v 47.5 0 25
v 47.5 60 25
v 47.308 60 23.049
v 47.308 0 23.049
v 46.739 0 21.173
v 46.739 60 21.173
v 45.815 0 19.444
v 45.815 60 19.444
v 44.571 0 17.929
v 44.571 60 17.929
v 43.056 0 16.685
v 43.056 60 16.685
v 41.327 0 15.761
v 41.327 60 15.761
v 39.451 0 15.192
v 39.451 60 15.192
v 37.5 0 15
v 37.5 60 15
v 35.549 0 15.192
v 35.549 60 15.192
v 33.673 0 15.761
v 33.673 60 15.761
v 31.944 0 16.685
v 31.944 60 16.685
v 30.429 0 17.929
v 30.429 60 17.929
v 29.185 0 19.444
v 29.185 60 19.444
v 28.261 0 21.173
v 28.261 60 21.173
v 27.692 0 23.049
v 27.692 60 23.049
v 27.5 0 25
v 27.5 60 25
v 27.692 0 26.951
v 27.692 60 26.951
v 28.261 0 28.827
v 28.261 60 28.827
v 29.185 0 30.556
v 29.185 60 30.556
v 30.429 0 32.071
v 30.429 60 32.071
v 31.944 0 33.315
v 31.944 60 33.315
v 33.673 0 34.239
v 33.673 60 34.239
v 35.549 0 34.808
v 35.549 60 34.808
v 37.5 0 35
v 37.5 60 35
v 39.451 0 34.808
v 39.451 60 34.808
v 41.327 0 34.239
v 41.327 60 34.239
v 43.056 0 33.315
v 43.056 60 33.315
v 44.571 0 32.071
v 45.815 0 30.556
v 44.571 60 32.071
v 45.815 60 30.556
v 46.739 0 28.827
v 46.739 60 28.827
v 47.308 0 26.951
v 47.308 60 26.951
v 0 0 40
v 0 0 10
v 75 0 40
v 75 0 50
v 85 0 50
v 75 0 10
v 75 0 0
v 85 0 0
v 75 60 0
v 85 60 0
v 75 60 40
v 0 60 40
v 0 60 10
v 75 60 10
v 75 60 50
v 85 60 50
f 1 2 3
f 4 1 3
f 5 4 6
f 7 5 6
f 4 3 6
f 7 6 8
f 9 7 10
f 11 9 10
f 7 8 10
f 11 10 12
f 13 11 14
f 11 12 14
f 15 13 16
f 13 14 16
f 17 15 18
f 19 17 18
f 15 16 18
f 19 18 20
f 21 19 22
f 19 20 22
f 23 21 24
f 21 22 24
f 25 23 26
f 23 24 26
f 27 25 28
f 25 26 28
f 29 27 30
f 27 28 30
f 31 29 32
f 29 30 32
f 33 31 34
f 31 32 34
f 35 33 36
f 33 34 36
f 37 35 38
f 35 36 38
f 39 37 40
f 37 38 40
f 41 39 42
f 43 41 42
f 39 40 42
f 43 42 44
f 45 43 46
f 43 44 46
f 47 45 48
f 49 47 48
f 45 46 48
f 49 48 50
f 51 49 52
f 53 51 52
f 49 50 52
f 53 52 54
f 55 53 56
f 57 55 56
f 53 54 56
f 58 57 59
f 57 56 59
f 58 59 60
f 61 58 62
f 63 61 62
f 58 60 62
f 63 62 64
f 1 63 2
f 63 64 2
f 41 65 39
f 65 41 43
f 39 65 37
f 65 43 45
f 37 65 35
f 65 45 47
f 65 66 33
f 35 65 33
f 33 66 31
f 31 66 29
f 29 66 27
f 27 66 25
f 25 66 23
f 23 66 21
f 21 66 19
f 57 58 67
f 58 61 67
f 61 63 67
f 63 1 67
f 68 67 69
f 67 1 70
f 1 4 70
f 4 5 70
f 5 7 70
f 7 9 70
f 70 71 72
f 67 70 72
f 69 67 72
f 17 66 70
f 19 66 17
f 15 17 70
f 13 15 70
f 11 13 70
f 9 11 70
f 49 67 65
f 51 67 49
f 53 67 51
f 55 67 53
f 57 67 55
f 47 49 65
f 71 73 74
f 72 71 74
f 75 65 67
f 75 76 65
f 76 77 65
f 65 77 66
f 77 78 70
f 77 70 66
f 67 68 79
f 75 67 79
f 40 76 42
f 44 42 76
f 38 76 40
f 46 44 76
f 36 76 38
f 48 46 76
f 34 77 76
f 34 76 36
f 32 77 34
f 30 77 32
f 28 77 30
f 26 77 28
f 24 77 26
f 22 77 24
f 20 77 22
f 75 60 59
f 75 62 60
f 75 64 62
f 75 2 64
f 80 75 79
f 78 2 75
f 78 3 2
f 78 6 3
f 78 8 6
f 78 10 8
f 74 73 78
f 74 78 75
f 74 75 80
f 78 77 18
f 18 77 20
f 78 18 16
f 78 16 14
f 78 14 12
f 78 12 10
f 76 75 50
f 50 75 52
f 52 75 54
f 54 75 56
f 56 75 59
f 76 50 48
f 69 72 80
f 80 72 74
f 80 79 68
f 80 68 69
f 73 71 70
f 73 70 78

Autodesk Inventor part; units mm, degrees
ref_plane "YZ Plane" through (0, 0, 0) normal (1, 0, 0) x (0, 1, 0)
ref_plane "XZ Plane" through (0, 0, 0) normal (0, 1, 0) x (-1, 0, 0)
ref_plane "XY Plane" through (0, 0, 0) normal (0, 0, 1) x (1, 0, 0)
sketch "Boceto1" plane through (0, 0, 0) normal (0, 0, 1) x (1, 0, 0)
  line L0 (0, 0) -> (85, 0)
  line L1 (85, 0) -> (85, 60)
  line L2 (0, 60) -> (0, 0)
  line L3 (0, 60) -> (85, 60)
  dimension "d0" = 85
  dimension "d1" = 60
extrude "Extrusión1" add sketch "Boceto1" along normal blind 50
sketch "Boceto3" plane through (0, 0, 50) normal (0, 0, 1) x (1, 0, 0)
  point P0 (0, 0)
ref_plane "Plano de trabajo3" through (0, 60, 50) normal (0, 0, 1) x (1, 0, 0)
sketch "Boceto4" plane through (0, 60, 50) normal (0, 0, 1) x (1, 0, 0)
  line L0 (0, -60) -> (85, -60) projected
  line L1 (0, -60) -> (75, -60)
  line L2 (75, -60) -> (75, 0)
  line L3 (75, 0) -> (0, 0)
  line L4 (0, 0) -> (0, -60) projected
  line L5 (0, 0) -> (0, -60)
  dimension "d7" = 75
  dimension "d8" = 60
extrude "Extrusión2" cut sketch "Boceto4" against normal blind 10
sketch "Boceto5" plane through (0, 0, 0) normal (0, 0, -1) x (-1, 0, 0)
  line L0 (0, 0) -> (-85, 0) projected
  line L1 (0, 0) -> (-75, 0)
  line L2 (-75, 0) -> (-75, 60)
  line L3 (-85, 60) -> (0, 60) projected
  line L4 (-75, 60) -> (0, 60)
  line L5 (0, 60) -> (0, 0) projected
  line L6 (0, 60) -> (0, 0)
  dimension "d11" = 75
  dimension "d12" = 60
extrude "Extrusión3" cut sketch "Boceto5" against normal blind 10
ref_plane "Plano de trabajo5" through (85, 60, 50) normal (0, 1, 0) x (1, 0, 0)
sketch "Boceto6" plane through (85, 60, 50) normal (0, 1, 0) x (1, 0, 0)
  line L0 (-85, 10) -> (-10, 10) projected
  line L1 (-10, 40) -> (-85, 40) projected
  circle A0 centre (-47.5, 25) radius 10
  point P0 (-85, 50)
  dimension "d15" = 20
extrude "Extrusión4" cut sketch "Boceto6" against normal through all
thread "Rosca1" size "M20x2.5" class "6H" standard "ANSI Metric M Profile" full length
properties part number "SoporteHerramienta"
